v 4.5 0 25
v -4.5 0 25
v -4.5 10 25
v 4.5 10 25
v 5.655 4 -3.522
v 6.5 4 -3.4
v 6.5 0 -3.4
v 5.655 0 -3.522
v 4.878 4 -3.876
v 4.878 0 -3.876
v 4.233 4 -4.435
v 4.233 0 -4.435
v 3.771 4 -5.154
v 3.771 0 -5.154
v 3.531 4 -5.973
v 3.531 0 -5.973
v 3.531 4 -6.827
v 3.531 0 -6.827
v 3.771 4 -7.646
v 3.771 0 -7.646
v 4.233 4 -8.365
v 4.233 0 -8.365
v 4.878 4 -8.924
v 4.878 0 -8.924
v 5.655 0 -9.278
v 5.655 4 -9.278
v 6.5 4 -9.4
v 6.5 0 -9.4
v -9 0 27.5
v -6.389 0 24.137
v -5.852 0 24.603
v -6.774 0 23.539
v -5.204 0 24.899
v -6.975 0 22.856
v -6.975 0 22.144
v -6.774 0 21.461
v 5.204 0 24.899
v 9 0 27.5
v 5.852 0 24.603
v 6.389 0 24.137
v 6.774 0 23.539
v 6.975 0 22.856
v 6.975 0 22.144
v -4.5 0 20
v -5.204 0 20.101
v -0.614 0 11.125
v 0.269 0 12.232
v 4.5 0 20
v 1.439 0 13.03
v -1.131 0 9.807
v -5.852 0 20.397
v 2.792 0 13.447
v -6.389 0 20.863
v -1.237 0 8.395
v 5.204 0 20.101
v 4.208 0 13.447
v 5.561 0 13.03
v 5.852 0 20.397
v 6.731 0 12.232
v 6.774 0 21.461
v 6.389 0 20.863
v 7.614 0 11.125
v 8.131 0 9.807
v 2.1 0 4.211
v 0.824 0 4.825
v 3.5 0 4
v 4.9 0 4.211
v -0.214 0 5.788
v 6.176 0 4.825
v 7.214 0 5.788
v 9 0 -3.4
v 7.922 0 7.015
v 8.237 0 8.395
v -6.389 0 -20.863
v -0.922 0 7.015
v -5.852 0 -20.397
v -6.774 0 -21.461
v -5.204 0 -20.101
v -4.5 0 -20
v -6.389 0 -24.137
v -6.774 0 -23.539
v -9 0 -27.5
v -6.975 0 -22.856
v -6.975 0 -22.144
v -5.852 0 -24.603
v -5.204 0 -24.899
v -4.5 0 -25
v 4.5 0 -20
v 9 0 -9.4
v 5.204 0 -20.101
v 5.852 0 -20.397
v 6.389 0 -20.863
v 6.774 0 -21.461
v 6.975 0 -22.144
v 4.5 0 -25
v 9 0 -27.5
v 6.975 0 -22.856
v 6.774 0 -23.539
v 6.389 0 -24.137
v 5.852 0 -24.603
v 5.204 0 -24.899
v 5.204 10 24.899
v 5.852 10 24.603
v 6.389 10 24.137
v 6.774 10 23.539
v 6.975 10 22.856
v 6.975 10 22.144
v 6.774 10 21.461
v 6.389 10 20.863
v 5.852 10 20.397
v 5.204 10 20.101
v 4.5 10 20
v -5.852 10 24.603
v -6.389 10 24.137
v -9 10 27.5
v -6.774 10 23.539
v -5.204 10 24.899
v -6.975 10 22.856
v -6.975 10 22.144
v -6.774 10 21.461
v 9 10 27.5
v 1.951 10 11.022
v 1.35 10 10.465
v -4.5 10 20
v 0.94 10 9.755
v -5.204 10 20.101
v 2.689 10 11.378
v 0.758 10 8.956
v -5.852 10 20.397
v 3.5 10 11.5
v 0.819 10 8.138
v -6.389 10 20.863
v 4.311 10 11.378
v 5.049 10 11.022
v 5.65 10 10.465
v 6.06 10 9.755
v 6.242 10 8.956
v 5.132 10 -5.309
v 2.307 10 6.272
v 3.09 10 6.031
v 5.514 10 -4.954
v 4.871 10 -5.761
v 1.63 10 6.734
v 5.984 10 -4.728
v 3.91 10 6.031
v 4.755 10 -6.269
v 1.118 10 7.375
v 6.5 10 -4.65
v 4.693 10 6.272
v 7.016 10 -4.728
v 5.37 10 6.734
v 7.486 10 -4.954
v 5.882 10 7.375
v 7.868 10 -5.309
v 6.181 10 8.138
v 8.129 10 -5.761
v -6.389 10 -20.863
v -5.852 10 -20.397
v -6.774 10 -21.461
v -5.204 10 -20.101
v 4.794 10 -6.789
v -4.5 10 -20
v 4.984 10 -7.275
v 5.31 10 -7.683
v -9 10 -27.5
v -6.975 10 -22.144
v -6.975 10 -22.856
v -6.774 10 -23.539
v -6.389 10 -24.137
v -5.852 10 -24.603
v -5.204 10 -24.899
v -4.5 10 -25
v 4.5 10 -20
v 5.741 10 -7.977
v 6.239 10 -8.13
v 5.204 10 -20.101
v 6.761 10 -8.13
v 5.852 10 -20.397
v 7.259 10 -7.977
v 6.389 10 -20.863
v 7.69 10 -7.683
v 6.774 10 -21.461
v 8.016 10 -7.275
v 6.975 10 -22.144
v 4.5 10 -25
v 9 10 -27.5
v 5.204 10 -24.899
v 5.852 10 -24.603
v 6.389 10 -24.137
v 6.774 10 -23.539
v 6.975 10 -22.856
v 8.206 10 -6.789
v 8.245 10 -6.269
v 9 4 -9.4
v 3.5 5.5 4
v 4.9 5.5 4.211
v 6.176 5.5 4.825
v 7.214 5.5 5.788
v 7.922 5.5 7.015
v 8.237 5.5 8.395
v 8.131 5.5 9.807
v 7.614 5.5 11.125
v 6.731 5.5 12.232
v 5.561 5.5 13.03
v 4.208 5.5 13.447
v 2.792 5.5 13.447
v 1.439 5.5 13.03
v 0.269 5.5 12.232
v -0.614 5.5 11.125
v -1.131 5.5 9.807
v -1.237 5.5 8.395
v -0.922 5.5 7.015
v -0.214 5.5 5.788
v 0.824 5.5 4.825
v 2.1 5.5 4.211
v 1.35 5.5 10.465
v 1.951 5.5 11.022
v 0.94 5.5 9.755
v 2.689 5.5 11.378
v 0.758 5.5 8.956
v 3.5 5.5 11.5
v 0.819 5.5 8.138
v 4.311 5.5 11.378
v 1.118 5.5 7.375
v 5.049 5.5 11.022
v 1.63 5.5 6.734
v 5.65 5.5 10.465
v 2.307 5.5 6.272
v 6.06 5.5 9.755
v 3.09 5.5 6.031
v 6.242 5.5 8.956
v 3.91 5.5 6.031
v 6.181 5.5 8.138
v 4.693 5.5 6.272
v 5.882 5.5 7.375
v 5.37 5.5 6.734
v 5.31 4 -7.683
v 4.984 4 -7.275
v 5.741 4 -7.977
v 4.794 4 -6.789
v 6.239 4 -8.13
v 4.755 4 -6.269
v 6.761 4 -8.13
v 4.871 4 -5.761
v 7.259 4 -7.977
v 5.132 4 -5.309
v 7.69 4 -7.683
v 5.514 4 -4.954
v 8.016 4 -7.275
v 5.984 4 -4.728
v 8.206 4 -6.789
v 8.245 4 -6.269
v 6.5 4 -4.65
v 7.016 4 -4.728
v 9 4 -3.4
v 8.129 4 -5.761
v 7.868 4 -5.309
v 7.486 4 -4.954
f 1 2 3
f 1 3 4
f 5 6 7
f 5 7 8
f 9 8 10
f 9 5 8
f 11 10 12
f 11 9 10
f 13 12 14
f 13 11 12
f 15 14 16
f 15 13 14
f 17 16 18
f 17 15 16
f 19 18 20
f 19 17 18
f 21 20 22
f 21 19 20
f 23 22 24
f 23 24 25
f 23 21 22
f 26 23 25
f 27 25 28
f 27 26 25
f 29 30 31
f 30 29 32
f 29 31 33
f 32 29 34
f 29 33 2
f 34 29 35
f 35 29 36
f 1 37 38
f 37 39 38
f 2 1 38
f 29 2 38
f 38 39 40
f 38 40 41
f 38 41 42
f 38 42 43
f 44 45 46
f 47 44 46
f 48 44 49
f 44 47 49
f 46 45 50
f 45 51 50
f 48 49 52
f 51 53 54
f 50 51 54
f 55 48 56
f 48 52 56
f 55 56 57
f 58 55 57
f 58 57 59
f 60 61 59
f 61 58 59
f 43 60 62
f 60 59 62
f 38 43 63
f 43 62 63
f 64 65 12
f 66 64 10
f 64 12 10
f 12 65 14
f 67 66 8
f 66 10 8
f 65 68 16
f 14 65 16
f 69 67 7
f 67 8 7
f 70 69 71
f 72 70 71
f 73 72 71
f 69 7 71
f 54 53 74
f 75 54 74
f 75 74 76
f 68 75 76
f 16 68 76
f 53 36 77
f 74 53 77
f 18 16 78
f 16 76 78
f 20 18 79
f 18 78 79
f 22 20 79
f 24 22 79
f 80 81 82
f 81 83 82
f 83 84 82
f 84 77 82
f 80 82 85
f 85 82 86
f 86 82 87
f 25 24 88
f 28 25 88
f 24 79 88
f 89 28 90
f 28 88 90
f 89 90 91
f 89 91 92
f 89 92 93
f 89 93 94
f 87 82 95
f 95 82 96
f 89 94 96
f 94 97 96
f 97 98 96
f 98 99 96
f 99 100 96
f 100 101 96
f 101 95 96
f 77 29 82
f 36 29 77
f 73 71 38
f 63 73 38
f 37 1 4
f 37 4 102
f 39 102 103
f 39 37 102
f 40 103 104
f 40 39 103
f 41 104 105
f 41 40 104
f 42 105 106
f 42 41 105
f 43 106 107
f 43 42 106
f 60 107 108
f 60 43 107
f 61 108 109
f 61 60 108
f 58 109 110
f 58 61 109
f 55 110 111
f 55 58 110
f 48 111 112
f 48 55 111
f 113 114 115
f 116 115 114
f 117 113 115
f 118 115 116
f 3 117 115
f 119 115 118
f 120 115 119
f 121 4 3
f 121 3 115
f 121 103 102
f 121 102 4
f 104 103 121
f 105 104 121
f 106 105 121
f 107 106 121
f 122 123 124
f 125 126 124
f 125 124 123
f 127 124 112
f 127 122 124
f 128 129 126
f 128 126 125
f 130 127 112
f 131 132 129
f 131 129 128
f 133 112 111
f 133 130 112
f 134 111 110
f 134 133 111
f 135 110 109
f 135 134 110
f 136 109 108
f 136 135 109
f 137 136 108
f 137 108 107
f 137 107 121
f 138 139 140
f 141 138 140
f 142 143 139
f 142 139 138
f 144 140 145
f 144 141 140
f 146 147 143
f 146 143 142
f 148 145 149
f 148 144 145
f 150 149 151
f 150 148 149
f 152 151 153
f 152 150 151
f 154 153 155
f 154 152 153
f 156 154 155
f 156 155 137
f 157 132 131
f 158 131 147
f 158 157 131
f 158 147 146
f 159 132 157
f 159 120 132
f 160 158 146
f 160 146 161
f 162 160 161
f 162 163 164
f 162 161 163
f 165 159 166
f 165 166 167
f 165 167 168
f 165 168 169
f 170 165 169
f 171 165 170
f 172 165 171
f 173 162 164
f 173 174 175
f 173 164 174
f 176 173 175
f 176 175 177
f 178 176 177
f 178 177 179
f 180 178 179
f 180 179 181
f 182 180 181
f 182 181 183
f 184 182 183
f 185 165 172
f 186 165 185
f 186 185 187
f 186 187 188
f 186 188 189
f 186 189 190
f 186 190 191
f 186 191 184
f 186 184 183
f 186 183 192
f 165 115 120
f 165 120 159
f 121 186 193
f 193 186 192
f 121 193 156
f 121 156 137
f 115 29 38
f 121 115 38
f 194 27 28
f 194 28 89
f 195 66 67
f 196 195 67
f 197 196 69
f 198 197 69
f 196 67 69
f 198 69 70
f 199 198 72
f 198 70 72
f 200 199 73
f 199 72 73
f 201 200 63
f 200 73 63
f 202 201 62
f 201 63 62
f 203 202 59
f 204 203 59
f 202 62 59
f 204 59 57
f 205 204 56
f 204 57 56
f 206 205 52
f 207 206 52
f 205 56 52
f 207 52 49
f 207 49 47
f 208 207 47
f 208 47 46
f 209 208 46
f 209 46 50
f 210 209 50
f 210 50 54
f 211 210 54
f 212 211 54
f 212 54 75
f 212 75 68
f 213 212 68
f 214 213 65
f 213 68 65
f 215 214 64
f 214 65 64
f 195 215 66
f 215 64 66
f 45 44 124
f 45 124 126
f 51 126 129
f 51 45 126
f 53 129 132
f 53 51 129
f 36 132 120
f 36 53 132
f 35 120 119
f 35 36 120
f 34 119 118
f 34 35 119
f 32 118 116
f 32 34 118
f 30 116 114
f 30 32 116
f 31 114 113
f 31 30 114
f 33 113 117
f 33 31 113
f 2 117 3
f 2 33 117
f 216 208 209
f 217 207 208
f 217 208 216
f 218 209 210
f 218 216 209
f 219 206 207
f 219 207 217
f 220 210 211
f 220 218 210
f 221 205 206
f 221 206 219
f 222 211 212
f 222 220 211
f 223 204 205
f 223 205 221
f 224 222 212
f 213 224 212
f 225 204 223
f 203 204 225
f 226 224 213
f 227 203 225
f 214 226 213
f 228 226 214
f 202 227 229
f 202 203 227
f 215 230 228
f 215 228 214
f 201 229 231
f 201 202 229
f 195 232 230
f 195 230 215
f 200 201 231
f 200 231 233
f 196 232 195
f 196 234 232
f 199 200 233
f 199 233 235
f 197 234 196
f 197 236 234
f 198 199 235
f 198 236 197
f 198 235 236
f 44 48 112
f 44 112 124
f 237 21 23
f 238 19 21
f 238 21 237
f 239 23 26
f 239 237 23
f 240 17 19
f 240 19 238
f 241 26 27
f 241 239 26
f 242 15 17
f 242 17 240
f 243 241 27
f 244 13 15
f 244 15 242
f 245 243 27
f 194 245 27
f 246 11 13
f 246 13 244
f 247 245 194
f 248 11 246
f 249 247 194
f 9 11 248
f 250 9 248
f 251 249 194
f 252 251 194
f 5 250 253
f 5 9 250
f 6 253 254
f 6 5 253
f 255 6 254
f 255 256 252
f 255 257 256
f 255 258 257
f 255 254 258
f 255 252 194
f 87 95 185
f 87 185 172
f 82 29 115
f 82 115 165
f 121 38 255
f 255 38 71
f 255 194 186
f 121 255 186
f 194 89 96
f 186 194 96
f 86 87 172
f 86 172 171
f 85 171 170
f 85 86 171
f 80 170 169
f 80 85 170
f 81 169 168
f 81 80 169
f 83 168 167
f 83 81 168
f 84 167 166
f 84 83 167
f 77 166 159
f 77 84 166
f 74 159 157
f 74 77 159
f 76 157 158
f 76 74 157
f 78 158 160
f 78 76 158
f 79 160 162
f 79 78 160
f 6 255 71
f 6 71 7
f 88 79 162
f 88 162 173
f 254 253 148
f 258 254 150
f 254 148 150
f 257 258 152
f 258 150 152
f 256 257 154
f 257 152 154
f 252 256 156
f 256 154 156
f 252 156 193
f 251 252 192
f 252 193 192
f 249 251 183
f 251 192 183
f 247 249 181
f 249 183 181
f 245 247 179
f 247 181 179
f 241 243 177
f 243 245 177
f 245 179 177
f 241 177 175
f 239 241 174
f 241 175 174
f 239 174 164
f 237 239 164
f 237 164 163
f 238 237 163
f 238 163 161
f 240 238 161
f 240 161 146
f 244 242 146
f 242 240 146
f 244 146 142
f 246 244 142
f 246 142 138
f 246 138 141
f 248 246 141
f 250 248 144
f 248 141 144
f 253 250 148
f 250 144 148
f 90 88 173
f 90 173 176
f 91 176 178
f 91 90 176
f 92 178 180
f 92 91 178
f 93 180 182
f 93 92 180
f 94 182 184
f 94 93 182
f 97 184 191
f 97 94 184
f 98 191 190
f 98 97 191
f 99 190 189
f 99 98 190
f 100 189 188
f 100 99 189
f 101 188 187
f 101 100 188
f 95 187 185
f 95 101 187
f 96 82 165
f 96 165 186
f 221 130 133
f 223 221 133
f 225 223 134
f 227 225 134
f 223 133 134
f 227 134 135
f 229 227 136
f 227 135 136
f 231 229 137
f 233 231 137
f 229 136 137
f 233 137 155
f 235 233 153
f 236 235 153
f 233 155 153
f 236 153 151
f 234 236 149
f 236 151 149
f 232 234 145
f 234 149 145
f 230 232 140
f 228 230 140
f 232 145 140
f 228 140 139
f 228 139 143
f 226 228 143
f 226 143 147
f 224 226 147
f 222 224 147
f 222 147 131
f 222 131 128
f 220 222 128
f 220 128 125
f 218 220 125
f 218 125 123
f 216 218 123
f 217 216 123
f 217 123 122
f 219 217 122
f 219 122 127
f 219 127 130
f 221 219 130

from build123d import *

# Parameters (mm, degrees)
SKETCH1_W           = 18
SKETCH1_H           = 55
BOSS_EXTRUDE1_DEPTH = 10
SKETCH2_R           = 2.75
SKETCH2_R_2         = 1.75
CUT_EXTRUDE1_DEPTH  = 31.61453903
SKETCH3_R           = 4.75
CUT_EXTRUDE2_DEPTH  = 5.5
CUT_EXTRUDE3_START  = -4
SKETCH4_R           = 1.75
CUT_EXTRUDE3_DEPTH  = 4
SKETCH5_R           = 2.5
CUT_EXTRUDE4_DEPTH  = 31.61453903


with BuildPart() as part:
    # Sketch1 → Boss-Extrude1 (new body)
    with BuildSketch(Plane(origin=(0, 0, 0), x_dir=(1, 0, 0), z_dir=(0, 1, 0))):
        Rectangle(SKETCH1_W, SKETCH1_H)
    extrude(amount=BOSS_EXTRUDE1_DEPTH)

    # Sketch2 → Cut-Extrude1 (cut, through all)
    with BuildSketch(Plane(origin=(0, 10, 0), x_dir=(1, 0, 0), z_dir=(0, 1, 0))):
        with Locations(Location((3.5, -8.75, 0), (0, 0, 270))):
            Circle(SKETCH2_R)
        with Locations(Location((6.5, 6.4, 0), (0, 0, 270))):
            Circle(SKETCH2_R_2)
    extrude(amount=-CUT_EXTRUDE1_DEPTH, mode=Mode.SUBTRACT)

    # Sketch3 → Cut-Extrude2 (cut)
    with BuildSketch(Plane.XZ):
        with Locations(Location((3.5, 8.75, 0), (0, 0, 270))):
            Circle(SKETCH3_R)
    extrude(amount=-CUT_EXTRUDE2_DEPTH, mode=Mode.SUBTRACT)

    # Sketch4 → Cut-Extrude3 (cut)
    # profile 1 of 3: a face of its own
    with BuildSketch(Plane.XZ.offset(CUT_EXTRUDE3_START)):
        with BuildLine():
            ThreePointArc((6.5, -3.4), (3.5, -6.4), (6.5, -9.4))
            ThreePointArc((6.5, -9.4), (7.918637165, -9.043382037), (9, -8.058312395))
            Line((9, -8.058312395), (9, -4.741687605))
            ThreePointArc((9, -4.741687605), (7.918637165, -3.756617963), (6.5, -3.4))
        make_face()
        with Locations(Location((6.5, -6.4, 0), (0, 0, 90))):
            Circle(SKETCH4_R, mode=Mode.SUBTRACT)
    # profile 2 of 3: a face of its own
    with BuildSketch(Plane.XZ.offset(CUT_EXTRUDE3_START)):
        with BuildLine():
            ThreePointArc((9, -8.058312395), (7.918637165, -9.043382037), (6.5, -9.4))
            Line((6.5, -9.4), (9, -9.4))
            Line((9, -9.4), (9, -8.058312395))
        make_face()
    # profile 3 of 3: a face of its own
    with BuildSketch(Plane.XZ.offset(CUT_EXTRUDE3_START)):
        with BuildLine():
            Line((9, -3.4), (6.5, -3.4))
            ThreePointArc((6.5, -3.4), (7.918637165, -3.756617963), (9, -4.741687605))
            Line((9, -4.741687605), (9, -3.4))
        make_face()
    extrude(amount=CUT_EXTRUDE3_DEPTH, mode=Mode.SUBTRACT)

    # Sketch5 → Cut-Extrude4 (cut, through all)
    with BuildSketch(Plane(origin=(0, 0, 0), x_dir=(1, 0, 0), z_dir=(0, 1, 0))):
        with Locations((-4.5, 22.5)):
            Circle(SKETCH5_R)
        with BuildLine():
            Line((4.5, 25), (-4.5, 25))
            ThreePointArc((-4.5, 25), (-2.732233047, 24.267766953), (-2, 22.5))
            ThreePointArc((-2, 22.5), (-2.732233047, 20.732233047), (-4.5, 20))
            Line((-4.5, 20), (4.5, 20))
            ThreePointArc((4.5, 20), (2, 22.5), (4.5, 25))
        make_face()
        with Locations((4.5, 22.5)):
            Circle(SKETCH5_R)
        with Locations((-4.5, -22.5)):
            Circle(SKETCH5_R)
        with BuildLine():
            ThreePointArc((4.5, -25), (2, -22.5), (4.5, -20))
            Line((4.5, -20), (-4.5, -20))
            ThreePointArc((-4.5, -20), (-2.732233047, -20.732233047), (-2, -22.5))
            ThreePointArc((-2, -22.5), (-2.732233047, -24.267766953), (-4.5, -25))
            Line((-4.5, -25), (4.5, -25))
        make_face()
        with Locations((4.5, -22.5)):
            Circle(SKETCH5_R)
    extrude(amount=CUT_EXTRUDE4_DEPTH, mode=Mode.SUBTRACT)


solid = part.part
